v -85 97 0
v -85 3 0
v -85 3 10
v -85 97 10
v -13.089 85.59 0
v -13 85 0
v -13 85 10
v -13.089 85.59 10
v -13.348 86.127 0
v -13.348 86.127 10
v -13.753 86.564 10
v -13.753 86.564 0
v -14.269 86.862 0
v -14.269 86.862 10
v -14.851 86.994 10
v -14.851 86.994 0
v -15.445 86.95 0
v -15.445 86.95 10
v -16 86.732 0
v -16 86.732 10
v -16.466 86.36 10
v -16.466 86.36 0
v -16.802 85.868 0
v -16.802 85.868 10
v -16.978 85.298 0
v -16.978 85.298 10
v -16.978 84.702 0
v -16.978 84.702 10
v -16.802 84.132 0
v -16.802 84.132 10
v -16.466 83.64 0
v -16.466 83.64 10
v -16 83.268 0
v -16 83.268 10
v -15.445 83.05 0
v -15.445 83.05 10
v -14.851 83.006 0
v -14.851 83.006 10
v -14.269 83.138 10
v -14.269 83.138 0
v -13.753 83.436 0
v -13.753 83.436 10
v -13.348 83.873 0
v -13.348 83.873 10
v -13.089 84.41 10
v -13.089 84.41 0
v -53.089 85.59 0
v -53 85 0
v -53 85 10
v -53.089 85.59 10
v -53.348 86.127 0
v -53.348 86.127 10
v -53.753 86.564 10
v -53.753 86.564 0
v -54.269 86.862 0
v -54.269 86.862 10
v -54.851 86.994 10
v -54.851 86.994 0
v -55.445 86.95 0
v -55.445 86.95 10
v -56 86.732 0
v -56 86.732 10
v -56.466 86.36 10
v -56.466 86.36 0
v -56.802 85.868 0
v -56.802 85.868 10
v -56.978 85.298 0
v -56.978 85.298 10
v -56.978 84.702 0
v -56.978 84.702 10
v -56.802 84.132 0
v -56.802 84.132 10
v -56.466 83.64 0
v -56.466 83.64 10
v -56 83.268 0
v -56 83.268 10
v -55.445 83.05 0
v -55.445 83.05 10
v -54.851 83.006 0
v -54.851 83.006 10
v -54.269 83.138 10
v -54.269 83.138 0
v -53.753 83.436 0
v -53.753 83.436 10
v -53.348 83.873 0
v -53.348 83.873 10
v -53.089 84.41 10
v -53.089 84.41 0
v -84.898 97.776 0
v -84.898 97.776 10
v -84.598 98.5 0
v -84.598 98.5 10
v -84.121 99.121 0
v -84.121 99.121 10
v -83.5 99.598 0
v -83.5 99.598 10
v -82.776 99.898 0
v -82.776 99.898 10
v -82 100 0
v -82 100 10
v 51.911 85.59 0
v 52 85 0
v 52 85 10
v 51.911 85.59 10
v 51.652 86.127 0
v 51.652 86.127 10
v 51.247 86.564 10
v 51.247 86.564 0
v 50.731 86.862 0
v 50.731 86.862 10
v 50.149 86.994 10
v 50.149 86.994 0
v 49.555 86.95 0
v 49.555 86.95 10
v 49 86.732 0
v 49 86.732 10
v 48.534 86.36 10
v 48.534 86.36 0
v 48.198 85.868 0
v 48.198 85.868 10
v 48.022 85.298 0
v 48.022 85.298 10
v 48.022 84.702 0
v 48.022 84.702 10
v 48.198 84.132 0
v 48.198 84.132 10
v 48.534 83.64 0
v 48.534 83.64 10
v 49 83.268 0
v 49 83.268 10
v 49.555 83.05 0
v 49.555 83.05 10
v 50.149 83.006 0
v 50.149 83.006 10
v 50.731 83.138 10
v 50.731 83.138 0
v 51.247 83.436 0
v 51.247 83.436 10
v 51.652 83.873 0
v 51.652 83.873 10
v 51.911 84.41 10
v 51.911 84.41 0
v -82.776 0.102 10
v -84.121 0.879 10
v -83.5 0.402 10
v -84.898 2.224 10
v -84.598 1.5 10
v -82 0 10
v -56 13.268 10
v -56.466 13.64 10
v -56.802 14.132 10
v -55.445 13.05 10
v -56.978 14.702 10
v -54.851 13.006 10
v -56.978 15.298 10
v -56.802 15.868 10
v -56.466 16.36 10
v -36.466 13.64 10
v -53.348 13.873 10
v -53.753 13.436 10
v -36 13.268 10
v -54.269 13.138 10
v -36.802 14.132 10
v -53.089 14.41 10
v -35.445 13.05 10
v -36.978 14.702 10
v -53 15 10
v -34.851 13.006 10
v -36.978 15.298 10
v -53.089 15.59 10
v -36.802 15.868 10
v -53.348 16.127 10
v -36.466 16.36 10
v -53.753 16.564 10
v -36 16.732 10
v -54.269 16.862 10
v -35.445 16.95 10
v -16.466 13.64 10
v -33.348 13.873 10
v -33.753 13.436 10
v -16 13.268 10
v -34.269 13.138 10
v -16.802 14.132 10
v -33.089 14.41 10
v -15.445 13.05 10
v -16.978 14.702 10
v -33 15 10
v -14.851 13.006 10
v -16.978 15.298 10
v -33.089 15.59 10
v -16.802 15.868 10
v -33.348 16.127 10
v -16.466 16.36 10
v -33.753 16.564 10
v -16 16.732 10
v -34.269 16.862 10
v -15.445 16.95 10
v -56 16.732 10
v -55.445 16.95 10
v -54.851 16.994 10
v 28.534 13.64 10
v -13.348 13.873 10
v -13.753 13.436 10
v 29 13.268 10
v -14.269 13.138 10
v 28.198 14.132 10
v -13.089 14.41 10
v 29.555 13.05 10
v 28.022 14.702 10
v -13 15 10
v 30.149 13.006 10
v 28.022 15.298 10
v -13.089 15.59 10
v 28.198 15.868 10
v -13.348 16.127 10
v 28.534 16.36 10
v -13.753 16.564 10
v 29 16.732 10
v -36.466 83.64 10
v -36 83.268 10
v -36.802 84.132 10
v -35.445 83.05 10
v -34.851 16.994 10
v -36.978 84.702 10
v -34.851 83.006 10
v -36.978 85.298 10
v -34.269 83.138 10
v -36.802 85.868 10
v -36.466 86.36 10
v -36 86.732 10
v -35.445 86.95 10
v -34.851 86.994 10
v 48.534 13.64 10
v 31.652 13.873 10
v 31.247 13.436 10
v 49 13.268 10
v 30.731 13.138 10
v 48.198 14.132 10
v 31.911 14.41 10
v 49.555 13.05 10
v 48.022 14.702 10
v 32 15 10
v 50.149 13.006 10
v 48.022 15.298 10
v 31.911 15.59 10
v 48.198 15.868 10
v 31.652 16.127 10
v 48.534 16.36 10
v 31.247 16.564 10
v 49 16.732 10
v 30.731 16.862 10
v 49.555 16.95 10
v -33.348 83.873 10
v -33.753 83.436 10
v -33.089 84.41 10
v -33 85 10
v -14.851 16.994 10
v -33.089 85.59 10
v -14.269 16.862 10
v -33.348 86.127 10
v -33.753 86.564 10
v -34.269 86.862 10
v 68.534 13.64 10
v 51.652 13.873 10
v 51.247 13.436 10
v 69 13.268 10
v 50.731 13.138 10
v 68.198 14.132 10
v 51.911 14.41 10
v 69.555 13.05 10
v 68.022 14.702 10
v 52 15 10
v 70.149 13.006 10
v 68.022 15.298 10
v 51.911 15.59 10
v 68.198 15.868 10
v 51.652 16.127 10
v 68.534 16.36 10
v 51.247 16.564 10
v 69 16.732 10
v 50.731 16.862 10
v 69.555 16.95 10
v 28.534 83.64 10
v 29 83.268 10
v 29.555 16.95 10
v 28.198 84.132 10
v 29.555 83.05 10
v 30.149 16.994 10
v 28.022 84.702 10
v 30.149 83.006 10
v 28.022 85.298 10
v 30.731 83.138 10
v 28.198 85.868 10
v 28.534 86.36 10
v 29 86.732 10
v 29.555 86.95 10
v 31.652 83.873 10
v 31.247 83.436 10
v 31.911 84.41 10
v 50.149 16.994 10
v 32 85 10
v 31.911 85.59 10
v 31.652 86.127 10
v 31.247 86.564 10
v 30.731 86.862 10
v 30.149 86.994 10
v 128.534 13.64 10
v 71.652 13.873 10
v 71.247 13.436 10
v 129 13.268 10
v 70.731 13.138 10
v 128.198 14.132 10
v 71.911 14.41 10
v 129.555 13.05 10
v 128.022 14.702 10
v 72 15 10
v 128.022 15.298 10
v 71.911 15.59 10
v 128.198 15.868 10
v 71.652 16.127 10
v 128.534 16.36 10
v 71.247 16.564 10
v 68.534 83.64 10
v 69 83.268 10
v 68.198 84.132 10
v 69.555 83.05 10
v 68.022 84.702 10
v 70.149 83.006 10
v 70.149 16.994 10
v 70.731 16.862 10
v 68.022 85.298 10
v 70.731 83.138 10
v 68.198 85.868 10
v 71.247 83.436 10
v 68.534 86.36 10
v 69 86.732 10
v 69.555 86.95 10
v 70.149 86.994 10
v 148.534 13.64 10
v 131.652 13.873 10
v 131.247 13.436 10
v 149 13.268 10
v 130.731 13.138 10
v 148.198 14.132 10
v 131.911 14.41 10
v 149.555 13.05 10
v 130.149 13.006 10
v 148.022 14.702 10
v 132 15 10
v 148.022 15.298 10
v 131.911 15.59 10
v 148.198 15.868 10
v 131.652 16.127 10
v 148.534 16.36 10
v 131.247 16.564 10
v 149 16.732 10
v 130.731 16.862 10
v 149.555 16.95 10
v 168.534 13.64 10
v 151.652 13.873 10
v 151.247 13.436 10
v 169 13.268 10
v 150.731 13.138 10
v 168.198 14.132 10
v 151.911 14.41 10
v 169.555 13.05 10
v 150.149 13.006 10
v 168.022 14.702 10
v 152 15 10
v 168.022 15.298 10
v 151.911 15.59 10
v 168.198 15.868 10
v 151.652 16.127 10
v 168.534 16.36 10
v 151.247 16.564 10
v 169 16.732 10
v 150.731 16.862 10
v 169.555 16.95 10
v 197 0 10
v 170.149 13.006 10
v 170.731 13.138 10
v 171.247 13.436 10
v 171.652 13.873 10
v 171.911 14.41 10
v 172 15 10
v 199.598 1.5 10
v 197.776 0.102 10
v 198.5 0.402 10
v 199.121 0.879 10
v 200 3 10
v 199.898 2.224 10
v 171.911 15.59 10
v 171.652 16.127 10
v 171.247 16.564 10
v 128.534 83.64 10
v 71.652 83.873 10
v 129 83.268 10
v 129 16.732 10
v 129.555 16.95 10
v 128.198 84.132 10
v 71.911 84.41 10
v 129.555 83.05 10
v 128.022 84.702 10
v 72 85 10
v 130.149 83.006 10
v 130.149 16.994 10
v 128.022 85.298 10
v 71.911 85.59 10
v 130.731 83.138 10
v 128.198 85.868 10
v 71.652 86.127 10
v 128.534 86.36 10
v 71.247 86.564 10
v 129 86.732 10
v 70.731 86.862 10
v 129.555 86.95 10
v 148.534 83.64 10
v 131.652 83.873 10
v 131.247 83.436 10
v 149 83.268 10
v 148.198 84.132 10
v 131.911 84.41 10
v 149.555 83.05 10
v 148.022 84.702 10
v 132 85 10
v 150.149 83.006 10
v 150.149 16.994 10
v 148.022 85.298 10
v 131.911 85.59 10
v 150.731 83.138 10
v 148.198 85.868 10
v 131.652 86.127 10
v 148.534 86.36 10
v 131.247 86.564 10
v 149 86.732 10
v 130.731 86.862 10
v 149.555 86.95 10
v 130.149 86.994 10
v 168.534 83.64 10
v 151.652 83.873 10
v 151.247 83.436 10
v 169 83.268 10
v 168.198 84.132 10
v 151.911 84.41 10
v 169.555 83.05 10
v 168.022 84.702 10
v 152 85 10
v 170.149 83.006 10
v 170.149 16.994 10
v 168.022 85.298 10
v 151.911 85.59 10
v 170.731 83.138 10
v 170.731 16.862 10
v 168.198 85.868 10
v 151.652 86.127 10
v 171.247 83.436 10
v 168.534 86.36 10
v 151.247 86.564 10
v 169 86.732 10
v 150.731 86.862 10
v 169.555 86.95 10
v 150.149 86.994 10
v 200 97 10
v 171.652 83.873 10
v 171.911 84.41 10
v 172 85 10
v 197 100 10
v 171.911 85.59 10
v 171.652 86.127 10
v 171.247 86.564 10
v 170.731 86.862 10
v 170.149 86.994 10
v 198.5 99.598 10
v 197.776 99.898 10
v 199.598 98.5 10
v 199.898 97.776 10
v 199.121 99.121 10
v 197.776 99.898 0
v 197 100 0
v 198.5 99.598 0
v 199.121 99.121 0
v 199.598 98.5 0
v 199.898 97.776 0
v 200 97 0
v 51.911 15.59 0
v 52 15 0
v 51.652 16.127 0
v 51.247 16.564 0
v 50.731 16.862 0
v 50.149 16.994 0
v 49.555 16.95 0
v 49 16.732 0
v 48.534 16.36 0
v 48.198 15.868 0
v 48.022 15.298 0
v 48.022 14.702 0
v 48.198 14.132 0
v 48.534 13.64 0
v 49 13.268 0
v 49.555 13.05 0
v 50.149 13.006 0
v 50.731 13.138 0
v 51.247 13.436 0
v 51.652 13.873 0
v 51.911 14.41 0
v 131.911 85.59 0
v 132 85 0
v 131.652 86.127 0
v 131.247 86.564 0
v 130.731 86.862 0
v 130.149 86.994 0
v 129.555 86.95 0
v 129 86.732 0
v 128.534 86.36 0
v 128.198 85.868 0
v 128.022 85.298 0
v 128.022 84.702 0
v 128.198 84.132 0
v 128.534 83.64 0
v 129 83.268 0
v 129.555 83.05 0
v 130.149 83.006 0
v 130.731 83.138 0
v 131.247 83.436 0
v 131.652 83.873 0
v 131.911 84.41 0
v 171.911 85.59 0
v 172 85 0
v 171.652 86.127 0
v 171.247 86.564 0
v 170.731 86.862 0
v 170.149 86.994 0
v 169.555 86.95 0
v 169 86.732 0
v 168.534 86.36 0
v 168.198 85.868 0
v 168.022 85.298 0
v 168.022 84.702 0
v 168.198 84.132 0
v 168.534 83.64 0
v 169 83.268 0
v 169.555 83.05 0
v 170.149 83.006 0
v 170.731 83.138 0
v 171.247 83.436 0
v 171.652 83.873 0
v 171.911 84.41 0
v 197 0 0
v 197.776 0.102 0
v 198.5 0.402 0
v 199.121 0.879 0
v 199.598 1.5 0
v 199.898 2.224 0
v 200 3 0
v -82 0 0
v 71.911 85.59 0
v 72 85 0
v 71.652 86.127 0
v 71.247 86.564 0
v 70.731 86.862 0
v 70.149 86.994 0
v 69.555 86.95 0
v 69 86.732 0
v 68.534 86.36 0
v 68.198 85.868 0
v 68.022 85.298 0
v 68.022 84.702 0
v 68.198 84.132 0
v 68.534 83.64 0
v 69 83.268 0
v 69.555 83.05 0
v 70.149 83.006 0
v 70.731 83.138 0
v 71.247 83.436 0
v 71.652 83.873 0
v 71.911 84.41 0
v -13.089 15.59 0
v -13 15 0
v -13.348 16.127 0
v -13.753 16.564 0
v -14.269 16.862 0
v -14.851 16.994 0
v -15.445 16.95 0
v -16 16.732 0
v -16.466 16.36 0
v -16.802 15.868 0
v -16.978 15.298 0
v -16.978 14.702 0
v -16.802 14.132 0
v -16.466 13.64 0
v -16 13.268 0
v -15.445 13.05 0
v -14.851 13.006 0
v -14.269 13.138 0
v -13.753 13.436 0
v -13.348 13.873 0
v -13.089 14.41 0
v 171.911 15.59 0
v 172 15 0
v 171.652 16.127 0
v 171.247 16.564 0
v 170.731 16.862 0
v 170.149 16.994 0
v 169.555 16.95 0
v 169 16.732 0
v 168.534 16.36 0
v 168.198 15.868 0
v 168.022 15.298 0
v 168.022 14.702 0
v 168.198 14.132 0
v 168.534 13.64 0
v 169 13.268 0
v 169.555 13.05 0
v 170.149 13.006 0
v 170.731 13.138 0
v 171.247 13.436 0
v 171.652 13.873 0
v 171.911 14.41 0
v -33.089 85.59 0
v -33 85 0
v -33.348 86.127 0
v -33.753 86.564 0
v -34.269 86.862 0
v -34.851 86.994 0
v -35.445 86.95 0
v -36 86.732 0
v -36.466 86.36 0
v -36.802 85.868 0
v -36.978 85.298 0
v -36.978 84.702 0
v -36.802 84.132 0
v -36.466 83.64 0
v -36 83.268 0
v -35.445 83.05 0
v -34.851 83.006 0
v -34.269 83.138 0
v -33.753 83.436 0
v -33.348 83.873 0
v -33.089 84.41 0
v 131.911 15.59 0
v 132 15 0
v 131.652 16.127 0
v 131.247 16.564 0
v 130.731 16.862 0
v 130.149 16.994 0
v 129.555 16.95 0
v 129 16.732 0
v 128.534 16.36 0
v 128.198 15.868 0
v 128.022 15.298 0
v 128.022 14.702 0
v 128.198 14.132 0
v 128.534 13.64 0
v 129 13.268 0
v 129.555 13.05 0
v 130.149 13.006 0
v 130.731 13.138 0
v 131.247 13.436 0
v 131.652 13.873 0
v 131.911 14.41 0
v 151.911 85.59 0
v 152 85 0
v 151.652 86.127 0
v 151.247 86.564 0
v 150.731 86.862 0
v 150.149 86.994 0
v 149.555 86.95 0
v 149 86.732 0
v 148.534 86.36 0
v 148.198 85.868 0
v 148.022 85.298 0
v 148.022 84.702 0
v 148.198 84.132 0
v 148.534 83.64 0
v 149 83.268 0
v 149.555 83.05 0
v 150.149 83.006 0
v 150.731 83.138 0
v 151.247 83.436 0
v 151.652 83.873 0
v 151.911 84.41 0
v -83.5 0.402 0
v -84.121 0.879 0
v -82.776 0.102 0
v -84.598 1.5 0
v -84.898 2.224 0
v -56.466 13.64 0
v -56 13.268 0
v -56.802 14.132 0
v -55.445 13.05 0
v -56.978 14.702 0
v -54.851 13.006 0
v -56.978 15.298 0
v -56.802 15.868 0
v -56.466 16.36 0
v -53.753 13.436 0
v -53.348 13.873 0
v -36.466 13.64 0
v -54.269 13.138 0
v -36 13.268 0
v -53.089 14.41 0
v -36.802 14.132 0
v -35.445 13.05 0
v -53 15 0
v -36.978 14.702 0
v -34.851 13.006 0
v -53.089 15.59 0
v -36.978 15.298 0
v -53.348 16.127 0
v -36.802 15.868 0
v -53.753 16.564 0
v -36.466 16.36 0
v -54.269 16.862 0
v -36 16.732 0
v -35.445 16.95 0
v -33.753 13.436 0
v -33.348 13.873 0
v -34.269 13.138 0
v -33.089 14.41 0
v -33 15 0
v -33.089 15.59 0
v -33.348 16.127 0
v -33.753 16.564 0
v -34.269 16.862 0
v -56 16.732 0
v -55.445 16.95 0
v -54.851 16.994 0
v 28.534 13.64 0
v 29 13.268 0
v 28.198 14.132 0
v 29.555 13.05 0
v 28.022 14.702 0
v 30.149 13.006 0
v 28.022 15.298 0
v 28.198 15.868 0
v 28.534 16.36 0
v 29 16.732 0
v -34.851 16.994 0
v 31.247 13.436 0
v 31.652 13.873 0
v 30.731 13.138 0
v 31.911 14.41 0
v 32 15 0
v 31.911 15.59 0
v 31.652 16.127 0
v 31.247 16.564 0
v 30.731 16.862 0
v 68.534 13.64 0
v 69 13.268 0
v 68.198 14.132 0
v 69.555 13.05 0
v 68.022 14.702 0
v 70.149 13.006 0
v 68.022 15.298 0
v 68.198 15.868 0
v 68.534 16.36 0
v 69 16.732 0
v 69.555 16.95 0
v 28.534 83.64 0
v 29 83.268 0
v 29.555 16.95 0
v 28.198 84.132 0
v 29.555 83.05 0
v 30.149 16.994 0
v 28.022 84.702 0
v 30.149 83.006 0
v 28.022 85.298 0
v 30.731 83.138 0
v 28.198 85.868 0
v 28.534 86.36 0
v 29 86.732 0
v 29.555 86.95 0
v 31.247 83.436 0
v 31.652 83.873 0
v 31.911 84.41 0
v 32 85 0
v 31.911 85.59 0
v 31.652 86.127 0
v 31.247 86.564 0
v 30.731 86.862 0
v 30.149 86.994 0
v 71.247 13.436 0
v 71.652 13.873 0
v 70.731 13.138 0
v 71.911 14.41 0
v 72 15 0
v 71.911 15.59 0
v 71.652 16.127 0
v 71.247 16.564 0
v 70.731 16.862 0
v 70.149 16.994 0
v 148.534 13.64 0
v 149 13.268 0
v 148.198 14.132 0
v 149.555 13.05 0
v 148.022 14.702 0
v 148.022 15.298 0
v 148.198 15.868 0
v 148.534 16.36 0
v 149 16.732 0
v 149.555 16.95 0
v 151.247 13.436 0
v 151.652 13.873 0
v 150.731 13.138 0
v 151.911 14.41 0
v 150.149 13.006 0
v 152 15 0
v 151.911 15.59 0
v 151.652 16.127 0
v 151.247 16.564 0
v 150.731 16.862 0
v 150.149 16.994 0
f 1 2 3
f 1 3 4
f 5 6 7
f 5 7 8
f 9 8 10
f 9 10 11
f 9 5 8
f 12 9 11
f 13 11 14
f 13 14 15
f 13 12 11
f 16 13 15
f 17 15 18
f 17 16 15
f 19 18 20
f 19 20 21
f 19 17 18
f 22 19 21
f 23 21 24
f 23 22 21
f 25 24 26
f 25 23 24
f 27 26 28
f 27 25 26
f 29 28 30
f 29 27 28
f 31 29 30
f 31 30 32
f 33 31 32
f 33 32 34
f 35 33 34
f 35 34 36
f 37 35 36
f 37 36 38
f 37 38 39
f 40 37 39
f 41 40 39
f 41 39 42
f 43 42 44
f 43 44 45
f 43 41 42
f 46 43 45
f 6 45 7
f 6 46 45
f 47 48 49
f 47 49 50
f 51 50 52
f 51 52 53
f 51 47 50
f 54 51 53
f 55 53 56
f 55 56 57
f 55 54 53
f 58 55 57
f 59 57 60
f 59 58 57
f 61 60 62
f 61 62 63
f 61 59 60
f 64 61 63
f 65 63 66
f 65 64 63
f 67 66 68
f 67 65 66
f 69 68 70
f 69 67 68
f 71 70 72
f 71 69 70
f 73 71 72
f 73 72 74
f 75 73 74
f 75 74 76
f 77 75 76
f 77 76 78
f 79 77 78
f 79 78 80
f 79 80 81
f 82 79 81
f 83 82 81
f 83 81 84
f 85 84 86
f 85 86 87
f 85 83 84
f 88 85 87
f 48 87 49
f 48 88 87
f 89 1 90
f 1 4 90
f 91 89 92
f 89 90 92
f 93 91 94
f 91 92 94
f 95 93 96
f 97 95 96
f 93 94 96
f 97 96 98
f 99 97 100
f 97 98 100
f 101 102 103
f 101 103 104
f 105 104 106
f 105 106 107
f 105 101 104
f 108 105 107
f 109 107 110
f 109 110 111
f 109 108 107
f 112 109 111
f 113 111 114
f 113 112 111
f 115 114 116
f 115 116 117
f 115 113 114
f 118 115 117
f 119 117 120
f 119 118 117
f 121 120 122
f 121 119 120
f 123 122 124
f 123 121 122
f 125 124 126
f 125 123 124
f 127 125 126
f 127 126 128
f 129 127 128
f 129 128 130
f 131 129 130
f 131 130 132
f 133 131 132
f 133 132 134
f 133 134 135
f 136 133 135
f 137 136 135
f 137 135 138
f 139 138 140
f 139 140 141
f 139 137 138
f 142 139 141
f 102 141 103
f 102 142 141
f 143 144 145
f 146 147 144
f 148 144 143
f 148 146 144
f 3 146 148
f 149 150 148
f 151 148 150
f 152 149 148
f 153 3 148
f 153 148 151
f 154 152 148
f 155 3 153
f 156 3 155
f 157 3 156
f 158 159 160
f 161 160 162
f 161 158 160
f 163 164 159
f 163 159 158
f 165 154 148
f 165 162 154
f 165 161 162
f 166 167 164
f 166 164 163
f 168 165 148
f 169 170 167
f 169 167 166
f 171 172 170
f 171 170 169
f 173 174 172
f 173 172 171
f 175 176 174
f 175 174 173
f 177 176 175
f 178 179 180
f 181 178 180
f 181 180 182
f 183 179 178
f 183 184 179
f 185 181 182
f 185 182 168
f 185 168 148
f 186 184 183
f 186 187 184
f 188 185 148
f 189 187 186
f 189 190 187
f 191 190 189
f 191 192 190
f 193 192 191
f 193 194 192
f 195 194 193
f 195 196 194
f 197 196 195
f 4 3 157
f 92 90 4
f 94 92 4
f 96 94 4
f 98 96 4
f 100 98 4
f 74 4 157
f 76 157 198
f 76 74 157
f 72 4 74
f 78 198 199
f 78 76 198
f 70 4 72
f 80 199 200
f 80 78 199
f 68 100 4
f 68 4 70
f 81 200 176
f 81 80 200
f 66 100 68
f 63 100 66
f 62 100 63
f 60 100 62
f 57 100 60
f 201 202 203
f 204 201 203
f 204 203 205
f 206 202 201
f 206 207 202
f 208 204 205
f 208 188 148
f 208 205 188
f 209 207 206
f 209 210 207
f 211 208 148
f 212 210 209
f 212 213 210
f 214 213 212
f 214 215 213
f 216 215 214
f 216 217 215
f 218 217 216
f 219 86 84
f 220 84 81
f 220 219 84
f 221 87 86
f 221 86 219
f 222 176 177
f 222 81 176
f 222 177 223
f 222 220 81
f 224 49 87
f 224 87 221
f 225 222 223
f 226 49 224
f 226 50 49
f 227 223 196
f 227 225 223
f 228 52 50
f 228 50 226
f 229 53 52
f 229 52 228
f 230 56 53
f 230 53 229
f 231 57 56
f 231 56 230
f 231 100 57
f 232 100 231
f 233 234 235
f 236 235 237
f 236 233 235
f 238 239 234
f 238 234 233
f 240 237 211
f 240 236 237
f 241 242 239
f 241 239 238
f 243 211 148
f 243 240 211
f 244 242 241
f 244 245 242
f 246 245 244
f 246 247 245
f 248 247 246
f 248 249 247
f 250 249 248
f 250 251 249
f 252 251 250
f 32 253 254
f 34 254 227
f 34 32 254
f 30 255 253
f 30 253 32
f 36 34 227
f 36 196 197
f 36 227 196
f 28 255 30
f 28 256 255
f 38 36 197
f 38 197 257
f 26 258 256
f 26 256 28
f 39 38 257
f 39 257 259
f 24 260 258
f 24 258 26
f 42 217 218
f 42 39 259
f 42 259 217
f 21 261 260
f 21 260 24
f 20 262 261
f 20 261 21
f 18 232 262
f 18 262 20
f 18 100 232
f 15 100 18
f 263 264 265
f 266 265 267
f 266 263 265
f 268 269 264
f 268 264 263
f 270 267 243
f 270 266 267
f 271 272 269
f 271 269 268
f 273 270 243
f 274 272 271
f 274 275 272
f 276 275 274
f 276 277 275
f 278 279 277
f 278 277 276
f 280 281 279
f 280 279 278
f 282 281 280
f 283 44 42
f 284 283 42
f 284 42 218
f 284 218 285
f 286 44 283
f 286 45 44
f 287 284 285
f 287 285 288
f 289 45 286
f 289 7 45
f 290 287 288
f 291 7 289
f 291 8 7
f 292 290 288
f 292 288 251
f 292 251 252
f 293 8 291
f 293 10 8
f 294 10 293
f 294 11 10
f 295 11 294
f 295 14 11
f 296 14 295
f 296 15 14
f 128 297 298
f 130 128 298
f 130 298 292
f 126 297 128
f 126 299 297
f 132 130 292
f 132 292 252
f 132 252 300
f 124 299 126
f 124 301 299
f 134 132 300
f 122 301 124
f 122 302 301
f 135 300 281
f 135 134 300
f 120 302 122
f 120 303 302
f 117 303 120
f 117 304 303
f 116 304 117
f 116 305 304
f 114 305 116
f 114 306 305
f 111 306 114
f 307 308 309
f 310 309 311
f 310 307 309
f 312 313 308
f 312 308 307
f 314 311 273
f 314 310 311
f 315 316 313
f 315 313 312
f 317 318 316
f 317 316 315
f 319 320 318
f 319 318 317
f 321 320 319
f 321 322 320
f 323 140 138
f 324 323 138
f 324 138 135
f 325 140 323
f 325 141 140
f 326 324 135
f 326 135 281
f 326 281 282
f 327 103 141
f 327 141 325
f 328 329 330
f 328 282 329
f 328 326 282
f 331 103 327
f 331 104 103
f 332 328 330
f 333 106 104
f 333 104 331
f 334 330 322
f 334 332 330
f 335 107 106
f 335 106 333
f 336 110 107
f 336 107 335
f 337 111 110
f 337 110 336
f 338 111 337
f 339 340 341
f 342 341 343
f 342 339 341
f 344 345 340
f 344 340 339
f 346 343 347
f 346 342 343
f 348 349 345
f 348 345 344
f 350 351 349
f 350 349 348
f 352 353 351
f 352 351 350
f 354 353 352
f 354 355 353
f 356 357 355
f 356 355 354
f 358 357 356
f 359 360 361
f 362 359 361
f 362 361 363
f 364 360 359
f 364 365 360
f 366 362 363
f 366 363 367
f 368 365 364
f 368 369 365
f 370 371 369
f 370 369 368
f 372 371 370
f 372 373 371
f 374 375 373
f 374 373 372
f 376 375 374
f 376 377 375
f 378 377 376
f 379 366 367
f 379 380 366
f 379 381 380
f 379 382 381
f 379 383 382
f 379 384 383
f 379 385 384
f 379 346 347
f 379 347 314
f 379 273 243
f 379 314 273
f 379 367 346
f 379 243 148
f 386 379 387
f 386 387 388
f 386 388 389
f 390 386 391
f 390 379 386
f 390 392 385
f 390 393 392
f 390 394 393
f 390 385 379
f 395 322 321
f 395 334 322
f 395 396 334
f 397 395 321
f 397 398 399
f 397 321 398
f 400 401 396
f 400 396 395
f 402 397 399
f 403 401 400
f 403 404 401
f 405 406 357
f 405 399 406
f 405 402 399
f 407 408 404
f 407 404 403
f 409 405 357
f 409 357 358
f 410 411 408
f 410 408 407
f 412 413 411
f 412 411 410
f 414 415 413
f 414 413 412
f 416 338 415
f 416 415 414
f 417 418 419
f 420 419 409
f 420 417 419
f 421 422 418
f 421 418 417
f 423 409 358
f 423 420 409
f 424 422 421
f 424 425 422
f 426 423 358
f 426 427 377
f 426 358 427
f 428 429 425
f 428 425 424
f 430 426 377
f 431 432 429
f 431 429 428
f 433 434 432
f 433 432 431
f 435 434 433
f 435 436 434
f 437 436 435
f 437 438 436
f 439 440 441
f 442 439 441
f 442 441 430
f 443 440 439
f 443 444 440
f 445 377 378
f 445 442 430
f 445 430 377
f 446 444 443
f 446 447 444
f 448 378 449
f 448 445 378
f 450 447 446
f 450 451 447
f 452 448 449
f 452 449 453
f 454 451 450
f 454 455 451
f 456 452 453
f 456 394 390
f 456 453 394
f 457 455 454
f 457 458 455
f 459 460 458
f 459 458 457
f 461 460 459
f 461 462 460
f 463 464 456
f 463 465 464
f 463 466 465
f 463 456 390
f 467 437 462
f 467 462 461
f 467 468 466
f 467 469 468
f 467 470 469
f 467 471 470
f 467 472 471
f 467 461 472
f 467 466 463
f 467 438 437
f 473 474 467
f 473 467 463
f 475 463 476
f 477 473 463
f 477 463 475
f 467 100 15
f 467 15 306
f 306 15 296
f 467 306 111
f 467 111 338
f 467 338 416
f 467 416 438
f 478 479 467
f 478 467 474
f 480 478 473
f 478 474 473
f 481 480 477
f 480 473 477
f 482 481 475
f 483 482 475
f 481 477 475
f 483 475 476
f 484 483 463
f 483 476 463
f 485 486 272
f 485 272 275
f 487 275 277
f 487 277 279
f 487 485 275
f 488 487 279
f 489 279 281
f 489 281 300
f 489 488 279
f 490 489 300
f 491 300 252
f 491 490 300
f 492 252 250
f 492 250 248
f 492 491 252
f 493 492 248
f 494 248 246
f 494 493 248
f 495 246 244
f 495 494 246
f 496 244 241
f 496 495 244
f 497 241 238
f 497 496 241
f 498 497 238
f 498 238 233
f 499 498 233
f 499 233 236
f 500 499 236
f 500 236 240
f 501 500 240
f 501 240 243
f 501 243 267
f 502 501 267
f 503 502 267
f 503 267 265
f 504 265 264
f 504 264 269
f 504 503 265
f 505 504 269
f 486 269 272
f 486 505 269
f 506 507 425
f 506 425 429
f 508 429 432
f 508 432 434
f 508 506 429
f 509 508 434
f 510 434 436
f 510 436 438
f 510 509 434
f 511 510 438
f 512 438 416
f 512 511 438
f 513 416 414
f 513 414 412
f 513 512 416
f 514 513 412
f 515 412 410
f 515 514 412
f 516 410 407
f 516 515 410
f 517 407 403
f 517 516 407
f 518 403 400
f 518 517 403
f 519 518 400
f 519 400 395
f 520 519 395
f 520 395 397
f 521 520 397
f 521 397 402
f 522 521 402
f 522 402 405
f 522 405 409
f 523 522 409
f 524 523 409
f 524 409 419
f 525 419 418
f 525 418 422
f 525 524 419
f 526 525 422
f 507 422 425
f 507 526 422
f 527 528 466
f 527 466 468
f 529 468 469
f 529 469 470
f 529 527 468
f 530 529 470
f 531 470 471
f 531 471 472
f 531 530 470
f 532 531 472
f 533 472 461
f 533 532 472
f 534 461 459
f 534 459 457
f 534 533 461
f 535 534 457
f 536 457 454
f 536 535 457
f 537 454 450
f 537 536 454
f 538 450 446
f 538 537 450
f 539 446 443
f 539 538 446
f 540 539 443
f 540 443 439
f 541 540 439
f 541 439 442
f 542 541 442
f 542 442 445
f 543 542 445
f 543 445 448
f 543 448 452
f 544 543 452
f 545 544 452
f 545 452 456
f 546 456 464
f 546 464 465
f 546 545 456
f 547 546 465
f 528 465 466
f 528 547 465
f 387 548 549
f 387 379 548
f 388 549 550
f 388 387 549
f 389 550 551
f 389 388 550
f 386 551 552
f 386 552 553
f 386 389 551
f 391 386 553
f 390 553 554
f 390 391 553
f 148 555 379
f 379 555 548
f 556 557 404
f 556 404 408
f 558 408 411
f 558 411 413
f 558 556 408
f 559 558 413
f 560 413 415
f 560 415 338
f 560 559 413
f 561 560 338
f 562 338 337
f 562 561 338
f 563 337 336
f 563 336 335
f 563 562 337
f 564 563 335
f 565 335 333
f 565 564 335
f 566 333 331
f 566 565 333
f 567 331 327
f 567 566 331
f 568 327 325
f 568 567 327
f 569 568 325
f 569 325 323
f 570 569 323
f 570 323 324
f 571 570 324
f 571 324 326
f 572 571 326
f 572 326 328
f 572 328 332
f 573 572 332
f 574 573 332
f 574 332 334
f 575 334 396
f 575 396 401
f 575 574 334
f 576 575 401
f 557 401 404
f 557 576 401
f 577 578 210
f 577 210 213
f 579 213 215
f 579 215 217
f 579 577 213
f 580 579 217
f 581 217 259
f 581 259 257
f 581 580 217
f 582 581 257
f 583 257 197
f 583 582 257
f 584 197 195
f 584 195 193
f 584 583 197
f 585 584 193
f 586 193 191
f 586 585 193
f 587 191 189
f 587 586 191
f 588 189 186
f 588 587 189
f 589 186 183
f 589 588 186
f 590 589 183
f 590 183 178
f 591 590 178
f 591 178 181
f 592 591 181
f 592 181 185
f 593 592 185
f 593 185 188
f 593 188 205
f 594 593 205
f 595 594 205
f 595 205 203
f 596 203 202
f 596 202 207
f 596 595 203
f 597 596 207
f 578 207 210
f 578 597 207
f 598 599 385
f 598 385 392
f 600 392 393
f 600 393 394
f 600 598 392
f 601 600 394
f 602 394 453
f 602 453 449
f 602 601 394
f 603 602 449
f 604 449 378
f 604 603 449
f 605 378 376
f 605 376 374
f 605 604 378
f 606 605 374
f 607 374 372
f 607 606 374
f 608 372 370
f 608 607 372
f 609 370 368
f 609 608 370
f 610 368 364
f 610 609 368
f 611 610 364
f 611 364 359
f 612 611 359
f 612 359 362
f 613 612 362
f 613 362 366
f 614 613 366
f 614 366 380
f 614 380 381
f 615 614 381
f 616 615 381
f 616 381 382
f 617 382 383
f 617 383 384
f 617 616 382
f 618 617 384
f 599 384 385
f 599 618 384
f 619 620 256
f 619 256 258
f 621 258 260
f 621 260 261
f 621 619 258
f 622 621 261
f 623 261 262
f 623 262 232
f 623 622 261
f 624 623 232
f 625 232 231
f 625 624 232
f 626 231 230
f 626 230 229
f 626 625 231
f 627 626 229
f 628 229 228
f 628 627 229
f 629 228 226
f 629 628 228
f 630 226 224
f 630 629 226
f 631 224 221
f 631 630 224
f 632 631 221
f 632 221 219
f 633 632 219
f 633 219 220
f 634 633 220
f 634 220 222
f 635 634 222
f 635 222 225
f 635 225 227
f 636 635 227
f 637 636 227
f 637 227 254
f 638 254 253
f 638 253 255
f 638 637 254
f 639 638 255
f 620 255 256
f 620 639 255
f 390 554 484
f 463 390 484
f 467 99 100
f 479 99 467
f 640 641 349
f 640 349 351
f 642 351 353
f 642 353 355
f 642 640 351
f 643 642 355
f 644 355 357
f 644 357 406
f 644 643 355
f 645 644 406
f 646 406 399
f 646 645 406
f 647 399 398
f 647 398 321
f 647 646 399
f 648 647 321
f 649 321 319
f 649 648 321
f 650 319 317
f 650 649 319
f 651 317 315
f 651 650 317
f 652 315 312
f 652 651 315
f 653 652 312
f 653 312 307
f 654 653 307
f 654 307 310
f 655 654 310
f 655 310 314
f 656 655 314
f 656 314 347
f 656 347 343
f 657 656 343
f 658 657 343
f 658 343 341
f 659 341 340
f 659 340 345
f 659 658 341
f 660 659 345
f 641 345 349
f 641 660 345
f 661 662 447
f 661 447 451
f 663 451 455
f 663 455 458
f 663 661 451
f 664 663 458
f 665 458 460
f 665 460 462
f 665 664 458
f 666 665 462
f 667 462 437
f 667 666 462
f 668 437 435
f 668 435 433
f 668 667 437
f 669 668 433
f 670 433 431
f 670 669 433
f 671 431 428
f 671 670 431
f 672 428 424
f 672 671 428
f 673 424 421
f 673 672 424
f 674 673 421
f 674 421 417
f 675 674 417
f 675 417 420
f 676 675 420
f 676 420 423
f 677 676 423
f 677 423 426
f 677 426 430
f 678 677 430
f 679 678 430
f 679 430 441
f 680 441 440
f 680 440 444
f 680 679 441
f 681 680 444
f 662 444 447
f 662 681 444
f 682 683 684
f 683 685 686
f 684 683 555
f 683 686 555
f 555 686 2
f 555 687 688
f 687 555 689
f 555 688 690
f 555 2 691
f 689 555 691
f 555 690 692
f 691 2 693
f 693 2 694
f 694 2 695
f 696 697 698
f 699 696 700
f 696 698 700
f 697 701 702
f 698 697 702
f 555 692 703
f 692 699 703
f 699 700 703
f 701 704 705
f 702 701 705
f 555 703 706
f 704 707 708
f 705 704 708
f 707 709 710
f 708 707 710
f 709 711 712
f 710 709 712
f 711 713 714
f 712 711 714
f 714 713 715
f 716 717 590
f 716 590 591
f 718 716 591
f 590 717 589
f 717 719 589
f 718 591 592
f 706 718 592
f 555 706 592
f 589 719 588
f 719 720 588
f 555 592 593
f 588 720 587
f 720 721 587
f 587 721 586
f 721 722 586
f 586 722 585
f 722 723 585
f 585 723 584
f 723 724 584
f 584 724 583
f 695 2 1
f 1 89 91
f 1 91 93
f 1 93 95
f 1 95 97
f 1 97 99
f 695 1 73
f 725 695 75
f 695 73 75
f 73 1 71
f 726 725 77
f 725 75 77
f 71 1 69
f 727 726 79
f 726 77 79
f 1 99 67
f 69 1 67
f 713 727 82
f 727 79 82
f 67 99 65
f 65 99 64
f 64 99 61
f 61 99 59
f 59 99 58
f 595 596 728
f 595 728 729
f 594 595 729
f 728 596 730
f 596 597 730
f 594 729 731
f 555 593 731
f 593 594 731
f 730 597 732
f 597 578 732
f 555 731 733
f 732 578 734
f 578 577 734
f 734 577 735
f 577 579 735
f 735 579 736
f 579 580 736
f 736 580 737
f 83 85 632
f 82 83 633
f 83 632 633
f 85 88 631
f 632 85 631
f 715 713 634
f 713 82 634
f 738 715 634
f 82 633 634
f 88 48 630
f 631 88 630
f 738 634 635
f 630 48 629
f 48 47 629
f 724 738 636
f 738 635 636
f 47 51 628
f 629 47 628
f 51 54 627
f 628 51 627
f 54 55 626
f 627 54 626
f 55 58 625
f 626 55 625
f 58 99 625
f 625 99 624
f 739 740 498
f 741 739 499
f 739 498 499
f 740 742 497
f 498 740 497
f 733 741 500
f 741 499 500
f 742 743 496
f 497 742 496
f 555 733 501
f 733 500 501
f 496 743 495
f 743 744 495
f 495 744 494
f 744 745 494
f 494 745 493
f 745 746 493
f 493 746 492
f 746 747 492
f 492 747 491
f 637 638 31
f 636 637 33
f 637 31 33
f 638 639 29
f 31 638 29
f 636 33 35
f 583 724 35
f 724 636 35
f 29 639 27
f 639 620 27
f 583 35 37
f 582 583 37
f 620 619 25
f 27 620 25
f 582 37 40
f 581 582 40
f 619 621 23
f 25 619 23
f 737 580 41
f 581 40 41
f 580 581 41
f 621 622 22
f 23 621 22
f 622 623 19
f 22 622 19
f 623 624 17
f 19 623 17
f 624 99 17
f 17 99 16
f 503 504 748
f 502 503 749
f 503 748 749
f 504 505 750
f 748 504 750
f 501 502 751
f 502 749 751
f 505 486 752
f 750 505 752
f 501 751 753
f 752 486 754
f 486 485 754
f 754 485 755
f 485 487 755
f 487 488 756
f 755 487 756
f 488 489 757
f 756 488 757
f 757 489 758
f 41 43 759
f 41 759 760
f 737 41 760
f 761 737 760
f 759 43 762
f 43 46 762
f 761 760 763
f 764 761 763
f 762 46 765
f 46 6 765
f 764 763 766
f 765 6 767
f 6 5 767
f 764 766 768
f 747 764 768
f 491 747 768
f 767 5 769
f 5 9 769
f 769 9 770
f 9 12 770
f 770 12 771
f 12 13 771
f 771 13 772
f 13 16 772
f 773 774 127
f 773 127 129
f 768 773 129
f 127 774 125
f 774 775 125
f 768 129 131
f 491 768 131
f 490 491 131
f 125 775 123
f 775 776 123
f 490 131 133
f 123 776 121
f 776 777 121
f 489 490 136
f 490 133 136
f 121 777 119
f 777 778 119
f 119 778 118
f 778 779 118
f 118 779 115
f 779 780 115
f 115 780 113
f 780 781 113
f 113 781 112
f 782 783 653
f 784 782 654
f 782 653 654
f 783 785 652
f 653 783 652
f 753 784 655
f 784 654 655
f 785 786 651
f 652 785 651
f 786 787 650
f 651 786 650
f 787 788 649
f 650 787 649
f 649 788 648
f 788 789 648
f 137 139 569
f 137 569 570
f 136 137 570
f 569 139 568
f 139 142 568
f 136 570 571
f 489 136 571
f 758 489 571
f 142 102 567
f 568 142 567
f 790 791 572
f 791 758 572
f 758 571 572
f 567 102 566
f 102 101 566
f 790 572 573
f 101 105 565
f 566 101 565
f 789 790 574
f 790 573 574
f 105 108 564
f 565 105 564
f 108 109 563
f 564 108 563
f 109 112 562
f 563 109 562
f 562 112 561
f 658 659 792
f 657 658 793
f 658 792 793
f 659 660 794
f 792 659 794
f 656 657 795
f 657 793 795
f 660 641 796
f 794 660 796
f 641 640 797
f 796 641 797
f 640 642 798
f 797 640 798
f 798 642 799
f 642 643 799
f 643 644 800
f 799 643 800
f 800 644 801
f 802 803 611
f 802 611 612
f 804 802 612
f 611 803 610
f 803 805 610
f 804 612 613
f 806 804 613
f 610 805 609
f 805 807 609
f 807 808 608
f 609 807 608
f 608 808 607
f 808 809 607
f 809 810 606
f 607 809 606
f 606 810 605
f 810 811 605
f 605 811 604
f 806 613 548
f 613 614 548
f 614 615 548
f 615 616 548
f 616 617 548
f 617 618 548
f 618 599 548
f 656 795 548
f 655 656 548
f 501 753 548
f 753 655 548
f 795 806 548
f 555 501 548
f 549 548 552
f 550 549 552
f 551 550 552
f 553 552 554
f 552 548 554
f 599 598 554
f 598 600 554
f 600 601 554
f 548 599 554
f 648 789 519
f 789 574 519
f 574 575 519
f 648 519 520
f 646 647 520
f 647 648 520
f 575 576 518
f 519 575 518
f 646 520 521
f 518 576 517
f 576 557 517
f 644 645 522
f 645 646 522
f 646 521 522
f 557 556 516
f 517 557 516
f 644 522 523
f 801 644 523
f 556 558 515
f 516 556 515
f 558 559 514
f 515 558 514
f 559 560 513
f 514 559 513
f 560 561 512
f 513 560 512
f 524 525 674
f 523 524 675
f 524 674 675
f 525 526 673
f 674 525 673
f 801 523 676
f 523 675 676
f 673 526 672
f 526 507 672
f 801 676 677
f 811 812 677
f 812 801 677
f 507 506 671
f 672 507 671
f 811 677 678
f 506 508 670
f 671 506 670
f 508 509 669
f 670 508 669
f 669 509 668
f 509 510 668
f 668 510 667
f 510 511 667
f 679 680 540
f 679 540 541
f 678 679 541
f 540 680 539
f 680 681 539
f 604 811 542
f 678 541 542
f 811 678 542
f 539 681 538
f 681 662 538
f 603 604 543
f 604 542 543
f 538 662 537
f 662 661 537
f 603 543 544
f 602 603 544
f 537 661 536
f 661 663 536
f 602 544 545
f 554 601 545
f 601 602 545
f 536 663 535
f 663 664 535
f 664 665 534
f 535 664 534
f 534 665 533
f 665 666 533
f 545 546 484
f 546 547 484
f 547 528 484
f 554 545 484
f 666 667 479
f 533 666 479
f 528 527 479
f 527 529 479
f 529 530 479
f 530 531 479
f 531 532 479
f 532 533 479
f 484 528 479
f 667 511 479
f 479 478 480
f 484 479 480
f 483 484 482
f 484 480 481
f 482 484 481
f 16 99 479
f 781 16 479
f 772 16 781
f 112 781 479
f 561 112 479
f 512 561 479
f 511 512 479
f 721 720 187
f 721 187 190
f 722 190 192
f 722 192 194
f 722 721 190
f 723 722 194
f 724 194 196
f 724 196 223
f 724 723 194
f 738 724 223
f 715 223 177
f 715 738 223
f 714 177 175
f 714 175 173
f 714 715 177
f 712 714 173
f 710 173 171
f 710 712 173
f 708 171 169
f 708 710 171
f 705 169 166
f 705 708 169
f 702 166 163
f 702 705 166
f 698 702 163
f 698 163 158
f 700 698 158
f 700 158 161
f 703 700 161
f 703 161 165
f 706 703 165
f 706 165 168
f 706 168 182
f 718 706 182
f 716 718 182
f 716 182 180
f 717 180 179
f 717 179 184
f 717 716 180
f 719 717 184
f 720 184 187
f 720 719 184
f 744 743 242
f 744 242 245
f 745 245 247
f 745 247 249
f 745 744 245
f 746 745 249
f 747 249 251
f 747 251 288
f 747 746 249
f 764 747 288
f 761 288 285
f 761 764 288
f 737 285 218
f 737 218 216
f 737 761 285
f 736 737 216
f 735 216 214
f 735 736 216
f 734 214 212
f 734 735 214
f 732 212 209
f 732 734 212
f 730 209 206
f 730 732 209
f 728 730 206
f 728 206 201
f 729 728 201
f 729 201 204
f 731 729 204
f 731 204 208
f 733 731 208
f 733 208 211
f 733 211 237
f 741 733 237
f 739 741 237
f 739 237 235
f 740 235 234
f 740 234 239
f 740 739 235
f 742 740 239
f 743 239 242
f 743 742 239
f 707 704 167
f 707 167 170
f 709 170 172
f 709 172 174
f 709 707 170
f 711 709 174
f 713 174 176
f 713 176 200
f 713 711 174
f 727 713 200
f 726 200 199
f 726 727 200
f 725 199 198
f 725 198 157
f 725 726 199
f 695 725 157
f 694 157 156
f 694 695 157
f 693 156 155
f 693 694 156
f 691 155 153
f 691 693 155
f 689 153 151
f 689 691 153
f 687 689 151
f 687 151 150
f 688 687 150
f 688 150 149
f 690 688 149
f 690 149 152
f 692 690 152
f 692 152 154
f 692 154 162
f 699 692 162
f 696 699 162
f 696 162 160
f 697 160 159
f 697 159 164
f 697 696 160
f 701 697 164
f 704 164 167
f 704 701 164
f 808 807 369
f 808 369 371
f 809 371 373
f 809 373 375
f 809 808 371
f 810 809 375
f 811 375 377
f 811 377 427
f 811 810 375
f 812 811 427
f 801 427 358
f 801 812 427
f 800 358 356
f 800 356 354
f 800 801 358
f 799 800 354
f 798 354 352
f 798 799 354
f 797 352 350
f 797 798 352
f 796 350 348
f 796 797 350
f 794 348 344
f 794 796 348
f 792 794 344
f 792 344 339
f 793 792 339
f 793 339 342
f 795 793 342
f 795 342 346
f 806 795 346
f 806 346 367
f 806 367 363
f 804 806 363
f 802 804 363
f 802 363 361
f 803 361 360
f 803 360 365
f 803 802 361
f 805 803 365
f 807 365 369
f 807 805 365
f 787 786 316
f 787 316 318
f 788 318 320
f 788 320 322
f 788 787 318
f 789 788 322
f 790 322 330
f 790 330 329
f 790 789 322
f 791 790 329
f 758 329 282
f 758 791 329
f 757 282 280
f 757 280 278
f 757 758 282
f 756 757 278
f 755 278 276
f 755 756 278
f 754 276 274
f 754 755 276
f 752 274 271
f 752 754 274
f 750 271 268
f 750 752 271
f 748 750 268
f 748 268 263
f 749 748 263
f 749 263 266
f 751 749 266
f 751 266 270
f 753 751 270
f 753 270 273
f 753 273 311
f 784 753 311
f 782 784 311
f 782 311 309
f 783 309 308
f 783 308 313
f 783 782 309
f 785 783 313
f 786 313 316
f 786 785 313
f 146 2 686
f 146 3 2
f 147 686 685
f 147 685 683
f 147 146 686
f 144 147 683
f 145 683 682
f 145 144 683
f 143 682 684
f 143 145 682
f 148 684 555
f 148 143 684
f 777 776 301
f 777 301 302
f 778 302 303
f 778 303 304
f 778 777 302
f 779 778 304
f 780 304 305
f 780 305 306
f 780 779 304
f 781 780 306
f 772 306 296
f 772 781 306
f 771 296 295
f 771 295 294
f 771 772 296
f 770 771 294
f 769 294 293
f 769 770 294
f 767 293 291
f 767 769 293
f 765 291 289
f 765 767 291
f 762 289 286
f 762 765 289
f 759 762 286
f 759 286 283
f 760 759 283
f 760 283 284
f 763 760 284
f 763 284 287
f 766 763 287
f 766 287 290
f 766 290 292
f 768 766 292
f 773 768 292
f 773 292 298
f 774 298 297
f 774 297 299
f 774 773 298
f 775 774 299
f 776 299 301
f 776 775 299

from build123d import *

# Parameters (mm, degrees)
SKETCH_W  = 285
SKETCH_H  = 100
SKETCH_R  = 2
PAD_DEPTH = 10
FILLET_R  = 3


with BuildPart() as part:
    # Sketch → Pad (new body)
    with BuildSketch(Plane.XY):
        with Locations((57.5, 50)):
            Rectangle(SKETCH_W, SKETCH_H)
        with Locations((30, 85)):
            Circle(SKETCH_R, mode=Mode.SUBTRACT)
        with Locations((30, 15)):
            Circle(SKETCH_R, mode=Mode.SUBTRACT)
        with Locations((170, 85)):
            Circle(SKETCH_R, mode=Mode.SUBTRACT)
        with Locations((170, 15)):
            Circle(SKETCH_R, mode=Mode.SUBTRACT)
        with Locations((50, 85)):
            Circle(SKETCH_R, mode=Mode.SUBTRACT)
        with Locations((50, 15)):
            Circle(SKETCH_R, mode=Mode.SUBTRACT)
        with Locations((150, 85)):
            Circle(SKETCH_R, mode=Mode.SUBTRACT)
        with Locations((150, 15)):
            Circle(SKETCH_R, mode=Mode.SUBTRACT)
        with Locations((70, 85)):
            Circle(SKETCH_R, mode=Mode.SUBTRACT)
        with Locations((70, 15)):
            Circle(SKETCH_R, mode=Mode.SUBTRACT)
        with Locations((130, 15)):
            Circle(SKETCH_R, mode=Mode.SUBTRACT)
        with Locations((130, 85)):
            Circle(SKETCH_R, mode=Mode.SUBTRACT)
        with Locations((-35, 15)):
            Circle(SKETCH_R, mode=Mode.SUBTRACT)
        with Locations((-15, 15)):
            Circle(SKETCH_R, mode=Mode.SUBTRACT)
        with Locations((-55, 15)):
            Circle(SKETCH_R, mode=Mode.SUBTRACT)
        with Locations((-55, 85)):
            Circle(SKETCH_R, mode=Mode.SUBTRACT)
        with Locations((-35, 85)):
            Circle(SKETCH_R, mode=Mode.SUBTRACT)
        with Locations((-15, 85)):
            Circle(SKETCH_R, mode=Mode.SUBTRACT)
    extrude(amount=PAD_DEPTH)

    # Fillet
    fillet_edges = [part.edges().sort_by_distance(p)[0] for p in [
        (-85, 0, 5),
        (200, 0, 5),
        (200, 100, 5),
        (-85, 100, 5),
    ]]
    fillet(fillet_edges, radius=FILLET_R)


solid = part.part
